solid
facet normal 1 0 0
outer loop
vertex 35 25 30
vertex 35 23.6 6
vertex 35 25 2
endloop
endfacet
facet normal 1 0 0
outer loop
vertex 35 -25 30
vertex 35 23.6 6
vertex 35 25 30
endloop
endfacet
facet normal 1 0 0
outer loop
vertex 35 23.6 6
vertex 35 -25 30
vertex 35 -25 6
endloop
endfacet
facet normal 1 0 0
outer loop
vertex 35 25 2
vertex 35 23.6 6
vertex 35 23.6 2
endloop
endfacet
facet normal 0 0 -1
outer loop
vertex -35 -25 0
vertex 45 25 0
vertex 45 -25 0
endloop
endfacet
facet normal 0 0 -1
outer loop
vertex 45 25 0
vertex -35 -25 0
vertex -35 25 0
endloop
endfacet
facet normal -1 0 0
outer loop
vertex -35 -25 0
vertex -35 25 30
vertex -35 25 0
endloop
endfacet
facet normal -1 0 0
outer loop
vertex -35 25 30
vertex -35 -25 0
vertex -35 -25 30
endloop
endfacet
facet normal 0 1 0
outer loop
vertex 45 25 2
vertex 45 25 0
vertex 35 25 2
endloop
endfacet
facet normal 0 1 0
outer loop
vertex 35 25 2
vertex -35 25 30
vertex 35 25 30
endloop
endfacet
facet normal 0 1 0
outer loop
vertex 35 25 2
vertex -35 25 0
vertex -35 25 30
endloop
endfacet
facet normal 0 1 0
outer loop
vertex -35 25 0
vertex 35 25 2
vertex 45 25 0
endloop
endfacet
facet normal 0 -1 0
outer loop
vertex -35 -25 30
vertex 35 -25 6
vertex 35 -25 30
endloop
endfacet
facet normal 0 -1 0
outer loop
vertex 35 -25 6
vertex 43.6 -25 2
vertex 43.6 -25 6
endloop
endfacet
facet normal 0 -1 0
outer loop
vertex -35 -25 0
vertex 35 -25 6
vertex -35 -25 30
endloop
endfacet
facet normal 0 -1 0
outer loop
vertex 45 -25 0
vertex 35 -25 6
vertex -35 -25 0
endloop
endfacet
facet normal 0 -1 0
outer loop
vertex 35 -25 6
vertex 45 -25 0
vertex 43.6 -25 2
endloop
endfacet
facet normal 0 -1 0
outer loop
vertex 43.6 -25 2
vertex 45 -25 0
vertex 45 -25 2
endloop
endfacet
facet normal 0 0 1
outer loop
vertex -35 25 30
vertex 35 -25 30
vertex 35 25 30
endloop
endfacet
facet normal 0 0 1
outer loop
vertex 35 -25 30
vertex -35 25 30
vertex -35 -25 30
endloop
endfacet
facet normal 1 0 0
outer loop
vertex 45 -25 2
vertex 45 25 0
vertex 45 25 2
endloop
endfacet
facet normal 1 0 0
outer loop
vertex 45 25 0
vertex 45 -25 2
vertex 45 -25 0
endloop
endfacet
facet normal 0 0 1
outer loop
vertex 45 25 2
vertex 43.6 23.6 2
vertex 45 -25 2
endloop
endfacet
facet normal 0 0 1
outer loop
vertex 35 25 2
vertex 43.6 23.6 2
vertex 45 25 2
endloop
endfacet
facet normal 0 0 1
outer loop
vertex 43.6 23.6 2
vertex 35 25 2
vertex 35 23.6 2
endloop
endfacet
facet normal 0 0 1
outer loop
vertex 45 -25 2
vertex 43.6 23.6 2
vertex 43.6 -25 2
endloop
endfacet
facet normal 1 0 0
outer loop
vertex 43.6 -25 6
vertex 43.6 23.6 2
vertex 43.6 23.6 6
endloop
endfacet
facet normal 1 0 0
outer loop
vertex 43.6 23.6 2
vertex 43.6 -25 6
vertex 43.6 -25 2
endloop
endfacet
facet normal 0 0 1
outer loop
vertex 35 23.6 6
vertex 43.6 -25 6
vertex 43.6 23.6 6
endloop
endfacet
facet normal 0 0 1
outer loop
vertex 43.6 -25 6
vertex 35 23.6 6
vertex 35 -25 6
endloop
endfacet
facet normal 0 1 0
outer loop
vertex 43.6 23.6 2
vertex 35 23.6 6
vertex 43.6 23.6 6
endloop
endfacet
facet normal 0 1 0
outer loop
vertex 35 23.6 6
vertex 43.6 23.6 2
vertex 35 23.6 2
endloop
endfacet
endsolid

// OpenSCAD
// Two-part enclosure for electronics board.
// Part 1: Box (left). Part 2: Lid (right, printed upside down).
// Both parts are centred on the XY plane at Z=0.

// --- Dimensions ---
// Box outer dimensions (X, Y, Z)
box_X = 70;
box_Y = 50;
box_Z = 30;

// Wall and floor thickness
wall_thick = 2;
floor_thick = 2;

// Gap between parts
gap = 10;

// Lid dimensions
lid_plate_thick = 2;
lip_wall_thick = 1.5;
lip_height = 4;

// Lid outer size (for the lip) - Prompt specified this, but it conflicts with clearance.
// We will calculate the actual outer size based on the clearance requirement to ensure it fits.
// Box Inner = 66 x 46.
// Lid Lip Inner must be 65.6 x 45.6 for 0.2mm clearance.
// Lid Lip Outer = Inner + 2*wall_thick = 68.6 x 48.6.
lip_inner_X = 65.6;
lip_inner_Y = 45.6;
lip_outer_X = lip_inner_X + 2 * lip_wall_thick;
lip_outer_Y = lip_inner_Y + 2 * lip_wall_thick;

// --- Part 1: Box ---
// Position: Centred at X = -gap/2, Y = 0, Z = 0.
// The box sits on Z=0.

module box() {
    translate([-box_X / 2, -box_Y / 2, 0]) {
        // Floor
        cube([box_X, box_Y, floor_thick]);
        
        // Walls (difference to cut out the inside)
        // We build the solid block and subtract the inner void.
        // Solid block:
        translate([0, 0, floor_thick]) cube([box_X, box_Y, box_Z - floor_thick]);
        
        // Inner void (cut out)
        // Void starts at floor_thick, goes up to box_Z.
        // Width: box_inner_X, Height: box_inner_Y.
        translate([0, 0, floor_thick]) cube([box_X - 2 * wall_thick, box_Y - 2 * wall_thick, box_Z - floor_thick]);
    }
}

// --- Part 2: Lid ---
// Position: Centred at X = gap/2, Y = 0, Z = 0.
// Printed upside down: Plate on bed, lip on top.
// Lid geometry:
// Plate: 70 x 50 x 2mm.
// Lip: Rectangular wall on top.
// Lip thickness: 1.5mm.
// Lip height: 4mm.
// Lip inner: 65.6 x 45.6 (to fit box).
// Lip outer: 68.6 x 48.6 (calculated).

module lid() {
    translate([-box_X / 2 + gap, -box_Y / 2, 0]) {
        // Plate
        cube([box_X, box_Y, lid_plate_thick]);
        
        // Lip
        // Lip is a hollow box on top of the plate.
        // Base of lip is at z = lid_plate_thick.
        // Top of lip is at z = lid_plate_thick + lip_height.
        // Outer dims: lip_outer_X, lip_outer_Y.
        // Inner dims: lip_inner_X, lip_inner_Y.
        
        // Solid block for the lip
        translate([0, 0, lid_plate_thick]) cube([lip_outer_X, lip_outer_Y, lip_height]);
        
        // Inner void for the lip
        translate([0, 0, lid_plate_thick]) cube([lip_inner_X, lip_inner_Y, lip_height]);
    }
}

// --- Assembly ---
difference() {
    // We use difference just to ensure the parts are distinct solids if we were to merge them,
    // but since they are separate modules, we just union them.
    // However, to strictly follow "difference" rule for cutting if needed, we can just union.
    // The prompt asks for a file that builds the part.
    union() {
        box();
        lid();
    }
}
